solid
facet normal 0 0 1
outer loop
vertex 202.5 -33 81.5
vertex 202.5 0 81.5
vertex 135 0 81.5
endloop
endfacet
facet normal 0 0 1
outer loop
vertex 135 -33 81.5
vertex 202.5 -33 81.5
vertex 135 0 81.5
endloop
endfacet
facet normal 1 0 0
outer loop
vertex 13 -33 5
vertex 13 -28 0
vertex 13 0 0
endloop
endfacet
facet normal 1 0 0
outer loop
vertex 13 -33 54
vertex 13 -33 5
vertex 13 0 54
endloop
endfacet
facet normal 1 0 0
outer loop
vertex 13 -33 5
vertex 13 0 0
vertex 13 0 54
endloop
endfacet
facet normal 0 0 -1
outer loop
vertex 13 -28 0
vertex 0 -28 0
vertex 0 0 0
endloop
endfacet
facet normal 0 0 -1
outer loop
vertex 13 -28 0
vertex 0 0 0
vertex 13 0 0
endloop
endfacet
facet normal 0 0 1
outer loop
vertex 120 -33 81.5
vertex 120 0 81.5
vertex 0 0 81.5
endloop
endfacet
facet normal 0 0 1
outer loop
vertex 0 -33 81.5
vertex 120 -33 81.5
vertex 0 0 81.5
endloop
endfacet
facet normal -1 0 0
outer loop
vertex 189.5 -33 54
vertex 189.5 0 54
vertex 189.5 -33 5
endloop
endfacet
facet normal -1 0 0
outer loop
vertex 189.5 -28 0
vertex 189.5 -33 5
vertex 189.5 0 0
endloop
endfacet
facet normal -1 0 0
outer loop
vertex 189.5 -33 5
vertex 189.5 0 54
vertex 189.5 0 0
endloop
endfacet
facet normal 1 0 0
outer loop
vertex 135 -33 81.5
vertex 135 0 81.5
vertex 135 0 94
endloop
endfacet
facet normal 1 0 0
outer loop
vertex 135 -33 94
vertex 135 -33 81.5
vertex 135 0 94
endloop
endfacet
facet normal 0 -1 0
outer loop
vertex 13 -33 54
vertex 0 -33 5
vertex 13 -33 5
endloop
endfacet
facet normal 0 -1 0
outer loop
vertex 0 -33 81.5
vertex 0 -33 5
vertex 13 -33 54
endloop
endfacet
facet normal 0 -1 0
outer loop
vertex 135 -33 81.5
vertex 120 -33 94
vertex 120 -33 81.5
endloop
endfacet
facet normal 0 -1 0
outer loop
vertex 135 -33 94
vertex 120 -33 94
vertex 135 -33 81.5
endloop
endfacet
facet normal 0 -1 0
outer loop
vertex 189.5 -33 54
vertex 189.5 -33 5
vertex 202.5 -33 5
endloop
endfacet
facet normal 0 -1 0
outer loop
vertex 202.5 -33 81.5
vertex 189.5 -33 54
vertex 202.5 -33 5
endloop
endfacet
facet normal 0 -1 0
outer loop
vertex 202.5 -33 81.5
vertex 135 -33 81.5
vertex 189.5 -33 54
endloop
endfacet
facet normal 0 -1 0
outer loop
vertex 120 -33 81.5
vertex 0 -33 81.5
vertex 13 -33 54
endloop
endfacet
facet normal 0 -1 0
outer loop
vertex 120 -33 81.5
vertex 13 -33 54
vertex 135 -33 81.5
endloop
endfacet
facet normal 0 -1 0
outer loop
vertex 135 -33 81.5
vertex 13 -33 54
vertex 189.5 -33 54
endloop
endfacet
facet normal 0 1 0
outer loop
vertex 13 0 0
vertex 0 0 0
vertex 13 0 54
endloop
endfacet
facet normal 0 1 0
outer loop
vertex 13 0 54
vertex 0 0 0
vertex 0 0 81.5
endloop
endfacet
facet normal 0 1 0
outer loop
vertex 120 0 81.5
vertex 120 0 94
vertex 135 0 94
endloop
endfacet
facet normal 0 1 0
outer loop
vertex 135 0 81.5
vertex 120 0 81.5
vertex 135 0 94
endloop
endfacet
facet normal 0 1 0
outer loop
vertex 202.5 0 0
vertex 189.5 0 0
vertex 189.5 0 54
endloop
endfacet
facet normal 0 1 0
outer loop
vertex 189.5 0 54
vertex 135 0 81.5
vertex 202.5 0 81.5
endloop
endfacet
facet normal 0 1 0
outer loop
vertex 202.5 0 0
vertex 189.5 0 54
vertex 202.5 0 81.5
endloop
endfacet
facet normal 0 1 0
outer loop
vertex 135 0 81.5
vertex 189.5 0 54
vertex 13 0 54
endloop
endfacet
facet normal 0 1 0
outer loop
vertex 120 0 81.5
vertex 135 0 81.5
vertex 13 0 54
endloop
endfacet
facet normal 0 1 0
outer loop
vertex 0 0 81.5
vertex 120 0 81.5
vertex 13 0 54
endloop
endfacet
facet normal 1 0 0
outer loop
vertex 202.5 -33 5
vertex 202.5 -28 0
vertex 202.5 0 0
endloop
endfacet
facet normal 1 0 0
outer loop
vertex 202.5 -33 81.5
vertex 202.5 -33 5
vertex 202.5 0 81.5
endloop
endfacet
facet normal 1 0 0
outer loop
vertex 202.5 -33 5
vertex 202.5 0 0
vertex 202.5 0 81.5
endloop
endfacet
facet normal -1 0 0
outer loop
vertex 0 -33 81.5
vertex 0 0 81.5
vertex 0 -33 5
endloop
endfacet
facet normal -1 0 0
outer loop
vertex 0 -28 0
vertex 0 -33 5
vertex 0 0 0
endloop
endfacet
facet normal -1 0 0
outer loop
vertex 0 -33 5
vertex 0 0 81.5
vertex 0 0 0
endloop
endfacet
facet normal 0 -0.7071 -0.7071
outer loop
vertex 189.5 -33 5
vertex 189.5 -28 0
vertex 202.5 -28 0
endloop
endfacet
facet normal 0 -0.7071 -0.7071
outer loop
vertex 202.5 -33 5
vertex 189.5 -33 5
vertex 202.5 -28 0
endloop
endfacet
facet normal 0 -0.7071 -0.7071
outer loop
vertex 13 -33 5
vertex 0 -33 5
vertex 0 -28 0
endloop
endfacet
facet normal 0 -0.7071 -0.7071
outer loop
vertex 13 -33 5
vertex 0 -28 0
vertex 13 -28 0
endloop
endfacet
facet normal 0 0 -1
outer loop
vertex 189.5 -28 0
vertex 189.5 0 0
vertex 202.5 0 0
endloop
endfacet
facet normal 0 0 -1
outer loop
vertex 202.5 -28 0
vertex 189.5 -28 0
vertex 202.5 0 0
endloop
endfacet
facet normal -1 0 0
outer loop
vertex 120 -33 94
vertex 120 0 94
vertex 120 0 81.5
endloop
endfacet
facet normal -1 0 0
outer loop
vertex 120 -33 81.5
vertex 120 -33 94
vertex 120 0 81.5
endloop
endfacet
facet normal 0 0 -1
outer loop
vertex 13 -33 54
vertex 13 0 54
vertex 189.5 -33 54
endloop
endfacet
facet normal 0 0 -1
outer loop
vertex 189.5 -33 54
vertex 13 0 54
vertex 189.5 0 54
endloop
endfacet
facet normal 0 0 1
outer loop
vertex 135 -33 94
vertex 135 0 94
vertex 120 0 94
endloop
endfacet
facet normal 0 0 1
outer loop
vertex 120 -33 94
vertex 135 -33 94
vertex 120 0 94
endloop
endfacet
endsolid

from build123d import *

# Parameters (mm, degrees)
F1_DEPTH = 33
F2_SIZE  = 5
F3_SIZE  = 5


with BuildPart() as f1:
    # F0 (on Front) → F1 (new body)
    with BuildSketch(Plane.XZ):
        Polygon((0, 81.5), (0, 0), (13, 0), (13, 54), (189.5, 54), (189.5, 0), (202.5, 0), (202.5, 81.5), (135, 81.5), (135, 94), (120, 94), (120, 81.5), align=None)
    extrude(amount=F1_DEPTH)

    # F2
    f2_edges = [f1.edges().sort_by_distance(p)[0] for p in [
        (6.5, -33, 0),
    ]]
    chamfer(f2_edges, length=F2_SIZE)

    # F3
    f3_edges = [f1.edges().sort_by_distance(p)[0] for p in [
        (196, -33, 0),
    ]]
    chamfer(f3_edges, length=F3_SIZE)


solid = f1.part
